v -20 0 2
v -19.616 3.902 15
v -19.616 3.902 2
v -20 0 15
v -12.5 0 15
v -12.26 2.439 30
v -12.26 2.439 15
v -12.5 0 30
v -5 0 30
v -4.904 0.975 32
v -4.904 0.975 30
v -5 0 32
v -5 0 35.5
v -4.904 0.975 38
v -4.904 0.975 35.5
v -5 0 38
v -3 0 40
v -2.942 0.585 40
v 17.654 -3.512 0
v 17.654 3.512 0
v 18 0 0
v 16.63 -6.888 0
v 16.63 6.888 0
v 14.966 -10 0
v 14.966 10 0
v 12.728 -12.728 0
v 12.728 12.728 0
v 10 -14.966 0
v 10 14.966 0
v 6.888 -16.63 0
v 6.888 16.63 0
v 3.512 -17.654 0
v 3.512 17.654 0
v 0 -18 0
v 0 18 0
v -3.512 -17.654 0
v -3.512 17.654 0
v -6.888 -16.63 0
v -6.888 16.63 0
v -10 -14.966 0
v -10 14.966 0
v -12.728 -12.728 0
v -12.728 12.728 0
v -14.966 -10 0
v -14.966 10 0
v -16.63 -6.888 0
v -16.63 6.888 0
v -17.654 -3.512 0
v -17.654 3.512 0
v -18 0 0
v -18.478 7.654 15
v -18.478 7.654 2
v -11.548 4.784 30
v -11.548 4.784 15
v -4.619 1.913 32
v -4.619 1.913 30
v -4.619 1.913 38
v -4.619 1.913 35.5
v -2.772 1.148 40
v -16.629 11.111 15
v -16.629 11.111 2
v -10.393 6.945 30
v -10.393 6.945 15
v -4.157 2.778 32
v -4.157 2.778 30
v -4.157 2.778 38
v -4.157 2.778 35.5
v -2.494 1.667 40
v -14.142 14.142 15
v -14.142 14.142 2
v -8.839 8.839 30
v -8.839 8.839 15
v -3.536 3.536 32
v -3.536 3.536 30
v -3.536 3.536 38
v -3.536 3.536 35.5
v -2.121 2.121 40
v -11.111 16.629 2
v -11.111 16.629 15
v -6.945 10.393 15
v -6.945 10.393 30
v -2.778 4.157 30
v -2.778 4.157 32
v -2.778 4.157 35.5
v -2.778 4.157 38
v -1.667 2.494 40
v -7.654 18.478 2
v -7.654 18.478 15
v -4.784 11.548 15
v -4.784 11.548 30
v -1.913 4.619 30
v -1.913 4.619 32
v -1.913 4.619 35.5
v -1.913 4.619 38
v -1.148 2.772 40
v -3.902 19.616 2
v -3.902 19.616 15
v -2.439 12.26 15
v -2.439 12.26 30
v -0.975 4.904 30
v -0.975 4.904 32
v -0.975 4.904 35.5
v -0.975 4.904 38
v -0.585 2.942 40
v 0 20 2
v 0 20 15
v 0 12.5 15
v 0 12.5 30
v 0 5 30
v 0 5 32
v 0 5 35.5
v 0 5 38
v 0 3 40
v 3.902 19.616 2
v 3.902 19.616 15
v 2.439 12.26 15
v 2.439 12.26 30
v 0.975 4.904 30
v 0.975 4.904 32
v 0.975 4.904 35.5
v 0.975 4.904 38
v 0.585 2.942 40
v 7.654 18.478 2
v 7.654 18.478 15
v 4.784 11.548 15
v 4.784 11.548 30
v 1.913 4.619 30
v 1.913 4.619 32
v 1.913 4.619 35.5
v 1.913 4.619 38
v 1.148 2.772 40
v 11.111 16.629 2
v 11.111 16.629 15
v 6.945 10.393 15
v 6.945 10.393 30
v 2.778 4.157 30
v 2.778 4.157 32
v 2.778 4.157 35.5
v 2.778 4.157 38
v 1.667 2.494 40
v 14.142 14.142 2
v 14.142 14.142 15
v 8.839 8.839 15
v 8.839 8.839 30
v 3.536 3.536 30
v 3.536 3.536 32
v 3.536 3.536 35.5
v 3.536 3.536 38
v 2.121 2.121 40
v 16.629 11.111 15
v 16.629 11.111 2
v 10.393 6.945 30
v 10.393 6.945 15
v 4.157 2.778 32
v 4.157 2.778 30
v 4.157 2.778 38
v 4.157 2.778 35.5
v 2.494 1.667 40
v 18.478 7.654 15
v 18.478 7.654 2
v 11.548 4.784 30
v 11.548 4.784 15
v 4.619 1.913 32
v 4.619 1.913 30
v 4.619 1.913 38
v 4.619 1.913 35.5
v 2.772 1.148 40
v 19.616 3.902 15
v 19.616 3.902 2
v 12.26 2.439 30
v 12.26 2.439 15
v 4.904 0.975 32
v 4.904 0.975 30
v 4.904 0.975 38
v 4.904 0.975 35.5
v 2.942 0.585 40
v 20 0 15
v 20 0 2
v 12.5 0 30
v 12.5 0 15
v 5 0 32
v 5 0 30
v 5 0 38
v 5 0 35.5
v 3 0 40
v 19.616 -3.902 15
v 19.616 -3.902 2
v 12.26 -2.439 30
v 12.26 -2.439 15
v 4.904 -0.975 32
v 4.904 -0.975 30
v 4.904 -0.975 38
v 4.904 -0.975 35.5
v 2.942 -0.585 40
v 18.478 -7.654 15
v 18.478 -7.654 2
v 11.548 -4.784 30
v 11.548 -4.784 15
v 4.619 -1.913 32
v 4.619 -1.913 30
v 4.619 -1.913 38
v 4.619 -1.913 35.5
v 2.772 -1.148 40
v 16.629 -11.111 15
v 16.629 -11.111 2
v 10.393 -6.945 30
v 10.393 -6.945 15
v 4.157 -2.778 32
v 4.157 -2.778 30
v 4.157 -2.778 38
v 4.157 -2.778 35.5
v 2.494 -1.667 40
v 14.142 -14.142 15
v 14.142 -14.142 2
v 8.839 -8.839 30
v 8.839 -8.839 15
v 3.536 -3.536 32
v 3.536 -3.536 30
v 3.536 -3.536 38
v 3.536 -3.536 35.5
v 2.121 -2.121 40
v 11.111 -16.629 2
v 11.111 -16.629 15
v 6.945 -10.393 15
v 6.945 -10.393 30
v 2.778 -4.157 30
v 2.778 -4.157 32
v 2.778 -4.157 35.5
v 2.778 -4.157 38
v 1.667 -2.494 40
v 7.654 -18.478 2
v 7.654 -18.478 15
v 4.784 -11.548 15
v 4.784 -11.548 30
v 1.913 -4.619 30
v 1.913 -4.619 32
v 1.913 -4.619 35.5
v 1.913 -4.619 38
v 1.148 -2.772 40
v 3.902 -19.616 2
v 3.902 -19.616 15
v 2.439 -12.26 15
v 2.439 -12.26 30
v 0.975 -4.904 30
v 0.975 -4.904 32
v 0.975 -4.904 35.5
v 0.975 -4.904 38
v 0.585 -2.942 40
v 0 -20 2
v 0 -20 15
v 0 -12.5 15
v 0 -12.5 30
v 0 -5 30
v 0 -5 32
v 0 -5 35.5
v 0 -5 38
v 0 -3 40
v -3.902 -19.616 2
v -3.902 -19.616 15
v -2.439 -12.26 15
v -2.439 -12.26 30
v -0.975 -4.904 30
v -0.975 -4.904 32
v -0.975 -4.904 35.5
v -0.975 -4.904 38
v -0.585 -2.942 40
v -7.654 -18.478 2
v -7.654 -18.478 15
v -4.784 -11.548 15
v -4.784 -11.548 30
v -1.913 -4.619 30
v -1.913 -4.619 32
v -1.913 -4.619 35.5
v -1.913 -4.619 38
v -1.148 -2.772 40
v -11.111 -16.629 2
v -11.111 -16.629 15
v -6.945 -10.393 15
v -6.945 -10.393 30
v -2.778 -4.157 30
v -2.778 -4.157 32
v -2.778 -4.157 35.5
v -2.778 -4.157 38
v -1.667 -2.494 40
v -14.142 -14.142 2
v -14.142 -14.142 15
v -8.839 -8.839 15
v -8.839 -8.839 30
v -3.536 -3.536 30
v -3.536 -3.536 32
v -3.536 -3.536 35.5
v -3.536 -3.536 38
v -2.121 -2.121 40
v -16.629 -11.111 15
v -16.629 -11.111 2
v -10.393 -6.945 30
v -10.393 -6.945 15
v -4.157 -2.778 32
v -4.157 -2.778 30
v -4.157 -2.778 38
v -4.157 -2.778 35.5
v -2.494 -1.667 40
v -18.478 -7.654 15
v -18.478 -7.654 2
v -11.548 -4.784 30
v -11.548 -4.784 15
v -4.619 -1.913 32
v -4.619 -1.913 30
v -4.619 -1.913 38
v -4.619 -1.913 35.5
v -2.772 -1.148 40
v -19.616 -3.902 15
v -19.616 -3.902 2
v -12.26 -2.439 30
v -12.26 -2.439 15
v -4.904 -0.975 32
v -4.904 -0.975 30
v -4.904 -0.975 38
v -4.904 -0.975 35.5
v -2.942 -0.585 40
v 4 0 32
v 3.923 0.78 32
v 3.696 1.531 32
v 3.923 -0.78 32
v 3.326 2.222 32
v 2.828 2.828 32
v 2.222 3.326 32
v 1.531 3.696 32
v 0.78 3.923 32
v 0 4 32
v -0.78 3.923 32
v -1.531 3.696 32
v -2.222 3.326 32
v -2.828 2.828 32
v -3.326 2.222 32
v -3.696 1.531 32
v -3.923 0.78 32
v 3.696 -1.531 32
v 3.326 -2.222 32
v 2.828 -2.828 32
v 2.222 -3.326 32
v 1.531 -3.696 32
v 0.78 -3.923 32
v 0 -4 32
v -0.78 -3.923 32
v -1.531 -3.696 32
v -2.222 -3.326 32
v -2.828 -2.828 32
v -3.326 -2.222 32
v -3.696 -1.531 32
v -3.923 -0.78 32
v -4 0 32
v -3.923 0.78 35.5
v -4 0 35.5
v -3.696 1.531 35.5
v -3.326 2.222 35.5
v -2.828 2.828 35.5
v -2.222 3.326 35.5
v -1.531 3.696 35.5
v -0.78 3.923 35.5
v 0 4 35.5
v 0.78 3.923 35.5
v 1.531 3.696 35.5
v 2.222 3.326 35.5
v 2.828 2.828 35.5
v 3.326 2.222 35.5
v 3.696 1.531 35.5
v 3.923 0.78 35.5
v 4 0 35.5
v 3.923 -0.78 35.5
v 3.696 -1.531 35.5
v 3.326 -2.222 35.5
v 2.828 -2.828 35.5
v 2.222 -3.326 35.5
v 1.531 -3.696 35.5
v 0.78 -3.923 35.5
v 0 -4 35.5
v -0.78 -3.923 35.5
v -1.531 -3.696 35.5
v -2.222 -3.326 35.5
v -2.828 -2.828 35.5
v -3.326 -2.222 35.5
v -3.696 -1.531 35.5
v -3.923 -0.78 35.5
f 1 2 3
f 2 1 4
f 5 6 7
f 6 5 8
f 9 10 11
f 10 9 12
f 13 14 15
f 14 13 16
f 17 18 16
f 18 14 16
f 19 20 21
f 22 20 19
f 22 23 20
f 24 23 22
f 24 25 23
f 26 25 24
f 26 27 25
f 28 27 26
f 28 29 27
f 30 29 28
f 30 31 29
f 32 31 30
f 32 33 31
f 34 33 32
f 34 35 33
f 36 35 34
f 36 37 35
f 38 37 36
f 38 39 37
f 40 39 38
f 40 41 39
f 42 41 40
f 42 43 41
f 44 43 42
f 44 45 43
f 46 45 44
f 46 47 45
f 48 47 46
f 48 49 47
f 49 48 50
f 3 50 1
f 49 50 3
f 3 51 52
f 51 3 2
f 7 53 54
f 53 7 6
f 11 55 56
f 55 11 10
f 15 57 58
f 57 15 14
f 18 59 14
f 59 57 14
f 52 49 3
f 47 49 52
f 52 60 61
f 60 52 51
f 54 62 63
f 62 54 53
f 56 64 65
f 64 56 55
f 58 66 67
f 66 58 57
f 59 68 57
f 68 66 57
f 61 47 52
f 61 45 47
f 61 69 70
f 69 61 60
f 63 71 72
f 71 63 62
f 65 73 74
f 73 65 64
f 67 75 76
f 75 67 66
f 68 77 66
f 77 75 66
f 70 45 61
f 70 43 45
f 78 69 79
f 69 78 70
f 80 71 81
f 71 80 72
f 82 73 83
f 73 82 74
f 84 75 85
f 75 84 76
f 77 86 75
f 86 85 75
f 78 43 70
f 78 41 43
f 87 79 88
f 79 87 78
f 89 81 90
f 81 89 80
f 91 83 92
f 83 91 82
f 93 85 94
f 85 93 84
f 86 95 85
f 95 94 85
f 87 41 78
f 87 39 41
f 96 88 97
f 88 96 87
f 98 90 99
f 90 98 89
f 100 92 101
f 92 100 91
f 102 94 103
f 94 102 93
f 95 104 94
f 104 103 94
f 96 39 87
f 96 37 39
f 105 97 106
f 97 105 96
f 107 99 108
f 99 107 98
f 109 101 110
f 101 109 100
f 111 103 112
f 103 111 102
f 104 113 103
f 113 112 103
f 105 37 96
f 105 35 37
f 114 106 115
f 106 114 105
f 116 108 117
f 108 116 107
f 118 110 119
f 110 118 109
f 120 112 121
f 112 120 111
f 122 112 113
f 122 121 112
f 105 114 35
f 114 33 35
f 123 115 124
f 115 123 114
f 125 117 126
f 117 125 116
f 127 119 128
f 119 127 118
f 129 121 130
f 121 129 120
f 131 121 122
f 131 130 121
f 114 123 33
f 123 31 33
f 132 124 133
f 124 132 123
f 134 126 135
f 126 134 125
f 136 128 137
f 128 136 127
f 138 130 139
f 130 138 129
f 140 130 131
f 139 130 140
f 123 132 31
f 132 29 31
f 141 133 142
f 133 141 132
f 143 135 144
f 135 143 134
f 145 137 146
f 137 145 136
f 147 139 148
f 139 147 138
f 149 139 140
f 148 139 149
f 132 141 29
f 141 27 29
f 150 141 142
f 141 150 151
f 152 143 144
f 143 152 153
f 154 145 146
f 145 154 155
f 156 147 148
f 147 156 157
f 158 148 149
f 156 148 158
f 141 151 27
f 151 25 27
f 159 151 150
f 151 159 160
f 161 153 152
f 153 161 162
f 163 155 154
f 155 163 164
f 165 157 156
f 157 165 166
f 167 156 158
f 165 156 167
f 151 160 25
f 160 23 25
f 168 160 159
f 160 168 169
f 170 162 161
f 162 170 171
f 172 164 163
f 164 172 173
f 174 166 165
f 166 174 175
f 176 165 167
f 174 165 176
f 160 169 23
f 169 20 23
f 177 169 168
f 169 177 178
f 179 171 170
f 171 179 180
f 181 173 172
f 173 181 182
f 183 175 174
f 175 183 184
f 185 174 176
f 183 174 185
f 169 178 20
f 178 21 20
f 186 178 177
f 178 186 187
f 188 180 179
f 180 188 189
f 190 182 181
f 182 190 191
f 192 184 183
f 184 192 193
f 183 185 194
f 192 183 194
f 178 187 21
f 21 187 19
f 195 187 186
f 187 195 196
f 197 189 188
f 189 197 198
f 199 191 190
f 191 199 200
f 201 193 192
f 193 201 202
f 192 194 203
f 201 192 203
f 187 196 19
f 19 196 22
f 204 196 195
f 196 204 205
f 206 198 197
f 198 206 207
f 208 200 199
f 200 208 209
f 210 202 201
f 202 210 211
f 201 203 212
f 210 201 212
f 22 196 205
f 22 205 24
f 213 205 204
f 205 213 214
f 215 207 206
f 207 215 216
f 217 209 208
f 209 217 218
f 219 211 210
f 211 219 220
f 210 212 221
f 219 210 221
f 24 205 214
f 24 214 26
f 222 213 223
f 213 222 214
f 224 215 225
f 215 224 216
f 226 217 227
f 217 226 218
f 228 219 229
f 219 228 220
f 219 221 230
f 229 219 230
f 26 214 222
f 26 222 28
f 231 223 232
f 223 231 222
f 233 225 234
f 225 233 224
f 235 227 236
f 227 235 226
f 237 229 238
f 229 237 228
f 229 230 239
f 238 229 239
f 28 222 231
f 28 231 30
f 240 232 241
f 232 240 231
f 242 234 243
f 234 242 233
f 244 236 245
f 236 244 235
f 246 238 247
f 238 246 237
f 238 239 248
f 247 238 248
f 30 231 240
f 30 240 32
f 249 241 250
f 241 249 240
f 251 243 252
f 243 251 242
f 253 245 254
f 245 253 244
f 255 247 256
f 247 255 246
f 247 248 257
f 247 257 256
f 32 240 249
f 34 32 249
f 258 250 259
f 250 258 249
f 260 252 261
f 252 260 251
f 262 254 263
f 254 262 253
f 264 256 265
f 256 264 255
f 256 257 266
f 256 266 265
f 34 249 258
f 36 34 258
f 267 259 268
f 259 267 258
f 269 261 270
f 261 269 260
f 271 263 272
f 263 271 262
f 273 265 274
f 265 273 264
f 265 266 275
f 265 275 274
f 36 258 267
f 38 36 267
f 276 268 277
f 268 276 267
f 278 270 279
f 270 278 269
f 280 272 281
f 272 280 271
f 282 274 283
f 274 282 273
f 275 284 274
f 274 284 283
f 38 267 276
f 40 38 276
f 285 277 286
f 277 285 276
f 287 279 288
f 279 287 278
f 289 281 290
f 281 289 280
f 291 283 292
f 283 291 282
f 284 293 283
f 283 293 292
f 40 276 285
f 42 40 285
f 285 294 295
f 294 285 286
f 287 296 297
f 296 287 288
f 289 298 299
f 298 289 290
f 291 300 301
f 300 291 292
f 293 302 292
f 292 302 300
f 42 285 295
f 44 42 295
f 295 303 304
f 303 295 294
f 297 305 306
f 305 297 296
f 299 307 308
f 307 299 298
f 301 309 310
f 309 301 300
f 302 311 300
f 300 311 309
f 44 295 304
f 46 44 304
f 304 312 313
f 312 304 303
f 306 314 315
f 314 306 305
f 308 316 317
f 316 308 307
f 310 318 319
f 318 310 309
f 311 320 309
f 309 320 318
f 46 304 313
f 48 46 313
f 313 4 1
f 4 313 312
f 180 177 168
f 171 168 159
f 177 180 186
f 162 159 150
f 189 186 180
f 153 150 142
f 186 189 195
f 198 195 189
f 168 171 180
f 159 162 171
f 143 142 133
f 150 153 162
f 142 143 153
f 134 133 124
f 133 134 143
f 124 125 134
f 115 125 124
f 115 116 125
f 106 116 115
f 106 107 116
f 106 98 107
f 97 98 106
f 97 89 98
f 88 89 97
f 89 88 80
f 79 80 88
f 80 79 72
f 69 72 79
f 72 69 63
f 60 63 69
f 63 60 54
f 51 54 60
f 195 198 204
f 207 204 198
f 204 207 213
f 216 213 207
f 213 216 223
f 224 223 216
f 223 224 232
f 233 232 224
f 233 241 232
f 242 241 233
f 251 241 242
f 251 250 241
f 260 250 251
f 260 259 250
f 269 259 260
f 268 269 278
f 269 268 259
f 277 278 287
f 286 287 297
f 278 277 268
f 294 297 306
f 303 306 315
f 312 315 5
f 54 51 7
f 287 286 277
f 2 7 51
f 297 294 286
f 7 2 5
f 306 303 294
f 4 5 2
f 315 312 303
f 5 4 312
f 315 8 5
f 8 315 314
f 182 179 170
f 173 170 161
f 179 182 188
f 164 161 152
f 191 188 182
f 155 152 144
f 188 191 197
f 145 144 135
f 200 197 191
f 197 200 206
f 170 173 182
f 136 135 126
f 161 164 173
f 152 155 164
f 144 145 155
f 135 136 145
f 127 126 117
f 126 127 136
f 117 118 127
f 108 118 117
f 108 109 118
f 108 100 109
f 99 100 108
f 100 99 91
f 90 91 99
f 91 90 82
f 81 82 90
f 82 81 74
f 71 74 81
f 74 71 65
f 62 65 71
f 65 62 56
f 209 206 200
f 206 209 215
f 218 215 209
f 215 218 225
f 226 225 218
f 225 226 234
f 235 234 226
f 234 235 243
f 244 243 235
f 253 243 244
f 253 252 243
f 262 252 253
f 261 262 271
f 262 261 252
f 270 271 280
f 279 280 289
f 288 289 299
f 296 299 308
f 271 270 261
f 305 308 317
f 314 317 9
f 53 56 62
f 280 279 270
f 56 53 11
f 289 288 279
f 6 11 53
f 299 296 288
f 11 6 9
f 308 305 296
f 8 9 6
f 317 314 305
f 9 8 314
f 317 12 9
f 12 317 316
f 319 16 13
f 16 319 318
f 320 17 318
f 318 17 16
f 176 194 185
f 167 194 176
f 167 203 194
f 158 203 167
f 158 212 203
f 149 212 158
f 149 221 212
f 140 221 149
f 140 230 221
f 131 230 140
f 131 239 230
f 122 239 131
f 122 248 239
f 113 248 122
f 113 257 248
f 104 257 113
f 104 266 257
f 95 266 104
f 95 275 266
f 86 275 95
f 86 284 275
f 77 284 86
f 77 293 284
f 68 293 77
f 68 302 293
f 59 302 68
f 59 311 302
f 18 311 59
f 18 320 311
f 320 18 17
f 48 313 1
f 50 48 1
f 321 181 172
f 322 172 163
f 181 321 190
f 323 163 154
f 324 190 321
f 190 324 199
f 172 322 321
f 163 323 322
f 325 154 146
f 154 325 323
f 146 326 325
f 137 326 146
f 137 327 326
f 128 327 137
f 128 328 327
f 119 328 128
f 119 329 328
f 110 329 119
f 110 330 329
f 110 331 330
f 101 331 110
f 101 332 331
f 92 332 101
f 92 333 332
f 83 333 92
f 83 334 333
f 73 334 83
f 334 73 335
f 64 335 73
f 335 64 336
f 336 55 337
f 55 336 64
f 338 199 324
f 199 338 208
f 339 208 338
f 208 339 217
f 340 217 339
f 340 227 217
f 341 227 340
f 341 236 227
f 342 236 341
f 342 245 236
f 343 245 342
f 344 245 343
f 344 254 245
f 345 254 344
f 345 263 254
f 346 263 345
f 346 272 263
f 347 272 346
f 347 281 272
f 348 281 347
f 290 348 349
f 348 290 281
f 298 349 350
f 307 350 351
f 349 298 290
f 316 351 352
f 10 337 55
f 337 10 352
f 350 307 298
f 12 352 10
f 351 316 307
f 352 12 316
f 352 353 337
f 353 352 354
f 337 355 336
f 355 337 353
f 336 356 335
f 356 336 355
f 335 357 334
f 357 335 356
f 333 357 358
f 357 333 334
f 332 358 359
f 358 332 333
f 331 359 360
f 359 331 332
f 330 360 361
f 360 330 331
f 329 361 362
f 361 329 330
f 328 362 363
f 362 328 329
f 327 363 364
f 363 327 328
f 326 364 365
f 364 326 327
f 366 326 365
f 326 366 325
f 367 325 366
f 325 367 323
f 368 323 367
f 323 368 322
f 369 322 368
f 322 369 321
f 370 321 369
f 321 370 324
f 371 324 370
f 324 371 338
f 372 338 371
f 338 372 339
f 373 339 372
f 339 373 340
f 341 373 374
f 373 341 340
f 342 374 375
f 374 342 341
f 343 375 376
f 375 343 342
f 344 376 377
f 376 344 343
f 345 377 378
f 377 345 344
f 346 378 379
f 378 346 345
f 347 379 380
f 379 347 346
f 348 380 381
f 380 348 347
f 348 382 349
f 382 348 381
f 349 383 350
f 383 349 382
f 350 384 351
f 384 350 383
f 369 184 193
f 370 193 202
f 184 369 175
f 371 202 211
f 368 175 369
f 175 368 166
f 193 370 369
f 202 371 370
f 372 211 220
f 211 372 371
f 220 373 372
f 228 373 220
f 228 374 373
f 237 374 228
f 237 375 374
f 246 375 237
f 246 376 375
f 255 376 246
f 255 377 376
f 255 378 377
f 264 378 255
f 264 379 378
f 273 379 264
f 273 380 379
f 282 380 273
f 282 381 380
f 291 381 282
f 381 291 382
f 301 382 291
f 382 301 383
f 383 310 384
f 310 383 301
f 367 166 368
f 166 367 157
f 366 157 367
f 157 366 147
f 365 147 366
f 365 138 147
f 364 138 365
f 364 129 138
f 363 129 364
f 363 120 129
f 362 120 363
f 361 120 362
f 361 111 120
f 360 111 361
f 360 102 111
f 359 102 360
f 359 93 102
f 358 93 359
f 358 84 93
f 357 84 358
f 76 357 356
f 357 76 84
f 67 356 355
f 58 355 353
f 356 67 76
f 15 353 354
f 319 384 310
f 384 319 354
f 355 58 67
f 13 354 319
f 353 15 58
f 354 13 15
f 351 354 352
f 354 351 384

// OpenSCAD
$fn = 32;

// ----------------------------------------------------------------------
// Stepped shaft: diameters 40, 25, 10 mm, 40 mm long
// ----------------------------------------------------------------------

// --- parameters (mm) ---
d1 = 40;                  // step 1 diameter
len1 = 15;                // step 1 length
d2 = 25;                  // step 2 diameter
len2 = 15;                // step 2 length
d3 = 10;                  // step 3 diameter
len3 = 10;                // step 3 length
total = 40;               // overall length
chamfer = 2;              // end chamfer
groove_r = 5;             // groove radius
groove_z = 32;            // groove position from the end
groove_w = 3.5;           // groove width
groove_d = 1;             // groove depth

/* closed turning profile: x is the radius, y is the length */
profile = [[0, 0], [20 - chamfer, 0], [20, chamfer], [20, 15], [12.5, 15], [12.5, 30], [5, 30], [5, 38], [3, 40], [0, 40]];

difference() {
  rotate_extrude() polygon(profile);
  /* circlip groove just behind the shoulder */
  rotate_extrude() translate([groove_r - groove_d, groove_z]) square([groove_d + 1, groove_w]);
}
